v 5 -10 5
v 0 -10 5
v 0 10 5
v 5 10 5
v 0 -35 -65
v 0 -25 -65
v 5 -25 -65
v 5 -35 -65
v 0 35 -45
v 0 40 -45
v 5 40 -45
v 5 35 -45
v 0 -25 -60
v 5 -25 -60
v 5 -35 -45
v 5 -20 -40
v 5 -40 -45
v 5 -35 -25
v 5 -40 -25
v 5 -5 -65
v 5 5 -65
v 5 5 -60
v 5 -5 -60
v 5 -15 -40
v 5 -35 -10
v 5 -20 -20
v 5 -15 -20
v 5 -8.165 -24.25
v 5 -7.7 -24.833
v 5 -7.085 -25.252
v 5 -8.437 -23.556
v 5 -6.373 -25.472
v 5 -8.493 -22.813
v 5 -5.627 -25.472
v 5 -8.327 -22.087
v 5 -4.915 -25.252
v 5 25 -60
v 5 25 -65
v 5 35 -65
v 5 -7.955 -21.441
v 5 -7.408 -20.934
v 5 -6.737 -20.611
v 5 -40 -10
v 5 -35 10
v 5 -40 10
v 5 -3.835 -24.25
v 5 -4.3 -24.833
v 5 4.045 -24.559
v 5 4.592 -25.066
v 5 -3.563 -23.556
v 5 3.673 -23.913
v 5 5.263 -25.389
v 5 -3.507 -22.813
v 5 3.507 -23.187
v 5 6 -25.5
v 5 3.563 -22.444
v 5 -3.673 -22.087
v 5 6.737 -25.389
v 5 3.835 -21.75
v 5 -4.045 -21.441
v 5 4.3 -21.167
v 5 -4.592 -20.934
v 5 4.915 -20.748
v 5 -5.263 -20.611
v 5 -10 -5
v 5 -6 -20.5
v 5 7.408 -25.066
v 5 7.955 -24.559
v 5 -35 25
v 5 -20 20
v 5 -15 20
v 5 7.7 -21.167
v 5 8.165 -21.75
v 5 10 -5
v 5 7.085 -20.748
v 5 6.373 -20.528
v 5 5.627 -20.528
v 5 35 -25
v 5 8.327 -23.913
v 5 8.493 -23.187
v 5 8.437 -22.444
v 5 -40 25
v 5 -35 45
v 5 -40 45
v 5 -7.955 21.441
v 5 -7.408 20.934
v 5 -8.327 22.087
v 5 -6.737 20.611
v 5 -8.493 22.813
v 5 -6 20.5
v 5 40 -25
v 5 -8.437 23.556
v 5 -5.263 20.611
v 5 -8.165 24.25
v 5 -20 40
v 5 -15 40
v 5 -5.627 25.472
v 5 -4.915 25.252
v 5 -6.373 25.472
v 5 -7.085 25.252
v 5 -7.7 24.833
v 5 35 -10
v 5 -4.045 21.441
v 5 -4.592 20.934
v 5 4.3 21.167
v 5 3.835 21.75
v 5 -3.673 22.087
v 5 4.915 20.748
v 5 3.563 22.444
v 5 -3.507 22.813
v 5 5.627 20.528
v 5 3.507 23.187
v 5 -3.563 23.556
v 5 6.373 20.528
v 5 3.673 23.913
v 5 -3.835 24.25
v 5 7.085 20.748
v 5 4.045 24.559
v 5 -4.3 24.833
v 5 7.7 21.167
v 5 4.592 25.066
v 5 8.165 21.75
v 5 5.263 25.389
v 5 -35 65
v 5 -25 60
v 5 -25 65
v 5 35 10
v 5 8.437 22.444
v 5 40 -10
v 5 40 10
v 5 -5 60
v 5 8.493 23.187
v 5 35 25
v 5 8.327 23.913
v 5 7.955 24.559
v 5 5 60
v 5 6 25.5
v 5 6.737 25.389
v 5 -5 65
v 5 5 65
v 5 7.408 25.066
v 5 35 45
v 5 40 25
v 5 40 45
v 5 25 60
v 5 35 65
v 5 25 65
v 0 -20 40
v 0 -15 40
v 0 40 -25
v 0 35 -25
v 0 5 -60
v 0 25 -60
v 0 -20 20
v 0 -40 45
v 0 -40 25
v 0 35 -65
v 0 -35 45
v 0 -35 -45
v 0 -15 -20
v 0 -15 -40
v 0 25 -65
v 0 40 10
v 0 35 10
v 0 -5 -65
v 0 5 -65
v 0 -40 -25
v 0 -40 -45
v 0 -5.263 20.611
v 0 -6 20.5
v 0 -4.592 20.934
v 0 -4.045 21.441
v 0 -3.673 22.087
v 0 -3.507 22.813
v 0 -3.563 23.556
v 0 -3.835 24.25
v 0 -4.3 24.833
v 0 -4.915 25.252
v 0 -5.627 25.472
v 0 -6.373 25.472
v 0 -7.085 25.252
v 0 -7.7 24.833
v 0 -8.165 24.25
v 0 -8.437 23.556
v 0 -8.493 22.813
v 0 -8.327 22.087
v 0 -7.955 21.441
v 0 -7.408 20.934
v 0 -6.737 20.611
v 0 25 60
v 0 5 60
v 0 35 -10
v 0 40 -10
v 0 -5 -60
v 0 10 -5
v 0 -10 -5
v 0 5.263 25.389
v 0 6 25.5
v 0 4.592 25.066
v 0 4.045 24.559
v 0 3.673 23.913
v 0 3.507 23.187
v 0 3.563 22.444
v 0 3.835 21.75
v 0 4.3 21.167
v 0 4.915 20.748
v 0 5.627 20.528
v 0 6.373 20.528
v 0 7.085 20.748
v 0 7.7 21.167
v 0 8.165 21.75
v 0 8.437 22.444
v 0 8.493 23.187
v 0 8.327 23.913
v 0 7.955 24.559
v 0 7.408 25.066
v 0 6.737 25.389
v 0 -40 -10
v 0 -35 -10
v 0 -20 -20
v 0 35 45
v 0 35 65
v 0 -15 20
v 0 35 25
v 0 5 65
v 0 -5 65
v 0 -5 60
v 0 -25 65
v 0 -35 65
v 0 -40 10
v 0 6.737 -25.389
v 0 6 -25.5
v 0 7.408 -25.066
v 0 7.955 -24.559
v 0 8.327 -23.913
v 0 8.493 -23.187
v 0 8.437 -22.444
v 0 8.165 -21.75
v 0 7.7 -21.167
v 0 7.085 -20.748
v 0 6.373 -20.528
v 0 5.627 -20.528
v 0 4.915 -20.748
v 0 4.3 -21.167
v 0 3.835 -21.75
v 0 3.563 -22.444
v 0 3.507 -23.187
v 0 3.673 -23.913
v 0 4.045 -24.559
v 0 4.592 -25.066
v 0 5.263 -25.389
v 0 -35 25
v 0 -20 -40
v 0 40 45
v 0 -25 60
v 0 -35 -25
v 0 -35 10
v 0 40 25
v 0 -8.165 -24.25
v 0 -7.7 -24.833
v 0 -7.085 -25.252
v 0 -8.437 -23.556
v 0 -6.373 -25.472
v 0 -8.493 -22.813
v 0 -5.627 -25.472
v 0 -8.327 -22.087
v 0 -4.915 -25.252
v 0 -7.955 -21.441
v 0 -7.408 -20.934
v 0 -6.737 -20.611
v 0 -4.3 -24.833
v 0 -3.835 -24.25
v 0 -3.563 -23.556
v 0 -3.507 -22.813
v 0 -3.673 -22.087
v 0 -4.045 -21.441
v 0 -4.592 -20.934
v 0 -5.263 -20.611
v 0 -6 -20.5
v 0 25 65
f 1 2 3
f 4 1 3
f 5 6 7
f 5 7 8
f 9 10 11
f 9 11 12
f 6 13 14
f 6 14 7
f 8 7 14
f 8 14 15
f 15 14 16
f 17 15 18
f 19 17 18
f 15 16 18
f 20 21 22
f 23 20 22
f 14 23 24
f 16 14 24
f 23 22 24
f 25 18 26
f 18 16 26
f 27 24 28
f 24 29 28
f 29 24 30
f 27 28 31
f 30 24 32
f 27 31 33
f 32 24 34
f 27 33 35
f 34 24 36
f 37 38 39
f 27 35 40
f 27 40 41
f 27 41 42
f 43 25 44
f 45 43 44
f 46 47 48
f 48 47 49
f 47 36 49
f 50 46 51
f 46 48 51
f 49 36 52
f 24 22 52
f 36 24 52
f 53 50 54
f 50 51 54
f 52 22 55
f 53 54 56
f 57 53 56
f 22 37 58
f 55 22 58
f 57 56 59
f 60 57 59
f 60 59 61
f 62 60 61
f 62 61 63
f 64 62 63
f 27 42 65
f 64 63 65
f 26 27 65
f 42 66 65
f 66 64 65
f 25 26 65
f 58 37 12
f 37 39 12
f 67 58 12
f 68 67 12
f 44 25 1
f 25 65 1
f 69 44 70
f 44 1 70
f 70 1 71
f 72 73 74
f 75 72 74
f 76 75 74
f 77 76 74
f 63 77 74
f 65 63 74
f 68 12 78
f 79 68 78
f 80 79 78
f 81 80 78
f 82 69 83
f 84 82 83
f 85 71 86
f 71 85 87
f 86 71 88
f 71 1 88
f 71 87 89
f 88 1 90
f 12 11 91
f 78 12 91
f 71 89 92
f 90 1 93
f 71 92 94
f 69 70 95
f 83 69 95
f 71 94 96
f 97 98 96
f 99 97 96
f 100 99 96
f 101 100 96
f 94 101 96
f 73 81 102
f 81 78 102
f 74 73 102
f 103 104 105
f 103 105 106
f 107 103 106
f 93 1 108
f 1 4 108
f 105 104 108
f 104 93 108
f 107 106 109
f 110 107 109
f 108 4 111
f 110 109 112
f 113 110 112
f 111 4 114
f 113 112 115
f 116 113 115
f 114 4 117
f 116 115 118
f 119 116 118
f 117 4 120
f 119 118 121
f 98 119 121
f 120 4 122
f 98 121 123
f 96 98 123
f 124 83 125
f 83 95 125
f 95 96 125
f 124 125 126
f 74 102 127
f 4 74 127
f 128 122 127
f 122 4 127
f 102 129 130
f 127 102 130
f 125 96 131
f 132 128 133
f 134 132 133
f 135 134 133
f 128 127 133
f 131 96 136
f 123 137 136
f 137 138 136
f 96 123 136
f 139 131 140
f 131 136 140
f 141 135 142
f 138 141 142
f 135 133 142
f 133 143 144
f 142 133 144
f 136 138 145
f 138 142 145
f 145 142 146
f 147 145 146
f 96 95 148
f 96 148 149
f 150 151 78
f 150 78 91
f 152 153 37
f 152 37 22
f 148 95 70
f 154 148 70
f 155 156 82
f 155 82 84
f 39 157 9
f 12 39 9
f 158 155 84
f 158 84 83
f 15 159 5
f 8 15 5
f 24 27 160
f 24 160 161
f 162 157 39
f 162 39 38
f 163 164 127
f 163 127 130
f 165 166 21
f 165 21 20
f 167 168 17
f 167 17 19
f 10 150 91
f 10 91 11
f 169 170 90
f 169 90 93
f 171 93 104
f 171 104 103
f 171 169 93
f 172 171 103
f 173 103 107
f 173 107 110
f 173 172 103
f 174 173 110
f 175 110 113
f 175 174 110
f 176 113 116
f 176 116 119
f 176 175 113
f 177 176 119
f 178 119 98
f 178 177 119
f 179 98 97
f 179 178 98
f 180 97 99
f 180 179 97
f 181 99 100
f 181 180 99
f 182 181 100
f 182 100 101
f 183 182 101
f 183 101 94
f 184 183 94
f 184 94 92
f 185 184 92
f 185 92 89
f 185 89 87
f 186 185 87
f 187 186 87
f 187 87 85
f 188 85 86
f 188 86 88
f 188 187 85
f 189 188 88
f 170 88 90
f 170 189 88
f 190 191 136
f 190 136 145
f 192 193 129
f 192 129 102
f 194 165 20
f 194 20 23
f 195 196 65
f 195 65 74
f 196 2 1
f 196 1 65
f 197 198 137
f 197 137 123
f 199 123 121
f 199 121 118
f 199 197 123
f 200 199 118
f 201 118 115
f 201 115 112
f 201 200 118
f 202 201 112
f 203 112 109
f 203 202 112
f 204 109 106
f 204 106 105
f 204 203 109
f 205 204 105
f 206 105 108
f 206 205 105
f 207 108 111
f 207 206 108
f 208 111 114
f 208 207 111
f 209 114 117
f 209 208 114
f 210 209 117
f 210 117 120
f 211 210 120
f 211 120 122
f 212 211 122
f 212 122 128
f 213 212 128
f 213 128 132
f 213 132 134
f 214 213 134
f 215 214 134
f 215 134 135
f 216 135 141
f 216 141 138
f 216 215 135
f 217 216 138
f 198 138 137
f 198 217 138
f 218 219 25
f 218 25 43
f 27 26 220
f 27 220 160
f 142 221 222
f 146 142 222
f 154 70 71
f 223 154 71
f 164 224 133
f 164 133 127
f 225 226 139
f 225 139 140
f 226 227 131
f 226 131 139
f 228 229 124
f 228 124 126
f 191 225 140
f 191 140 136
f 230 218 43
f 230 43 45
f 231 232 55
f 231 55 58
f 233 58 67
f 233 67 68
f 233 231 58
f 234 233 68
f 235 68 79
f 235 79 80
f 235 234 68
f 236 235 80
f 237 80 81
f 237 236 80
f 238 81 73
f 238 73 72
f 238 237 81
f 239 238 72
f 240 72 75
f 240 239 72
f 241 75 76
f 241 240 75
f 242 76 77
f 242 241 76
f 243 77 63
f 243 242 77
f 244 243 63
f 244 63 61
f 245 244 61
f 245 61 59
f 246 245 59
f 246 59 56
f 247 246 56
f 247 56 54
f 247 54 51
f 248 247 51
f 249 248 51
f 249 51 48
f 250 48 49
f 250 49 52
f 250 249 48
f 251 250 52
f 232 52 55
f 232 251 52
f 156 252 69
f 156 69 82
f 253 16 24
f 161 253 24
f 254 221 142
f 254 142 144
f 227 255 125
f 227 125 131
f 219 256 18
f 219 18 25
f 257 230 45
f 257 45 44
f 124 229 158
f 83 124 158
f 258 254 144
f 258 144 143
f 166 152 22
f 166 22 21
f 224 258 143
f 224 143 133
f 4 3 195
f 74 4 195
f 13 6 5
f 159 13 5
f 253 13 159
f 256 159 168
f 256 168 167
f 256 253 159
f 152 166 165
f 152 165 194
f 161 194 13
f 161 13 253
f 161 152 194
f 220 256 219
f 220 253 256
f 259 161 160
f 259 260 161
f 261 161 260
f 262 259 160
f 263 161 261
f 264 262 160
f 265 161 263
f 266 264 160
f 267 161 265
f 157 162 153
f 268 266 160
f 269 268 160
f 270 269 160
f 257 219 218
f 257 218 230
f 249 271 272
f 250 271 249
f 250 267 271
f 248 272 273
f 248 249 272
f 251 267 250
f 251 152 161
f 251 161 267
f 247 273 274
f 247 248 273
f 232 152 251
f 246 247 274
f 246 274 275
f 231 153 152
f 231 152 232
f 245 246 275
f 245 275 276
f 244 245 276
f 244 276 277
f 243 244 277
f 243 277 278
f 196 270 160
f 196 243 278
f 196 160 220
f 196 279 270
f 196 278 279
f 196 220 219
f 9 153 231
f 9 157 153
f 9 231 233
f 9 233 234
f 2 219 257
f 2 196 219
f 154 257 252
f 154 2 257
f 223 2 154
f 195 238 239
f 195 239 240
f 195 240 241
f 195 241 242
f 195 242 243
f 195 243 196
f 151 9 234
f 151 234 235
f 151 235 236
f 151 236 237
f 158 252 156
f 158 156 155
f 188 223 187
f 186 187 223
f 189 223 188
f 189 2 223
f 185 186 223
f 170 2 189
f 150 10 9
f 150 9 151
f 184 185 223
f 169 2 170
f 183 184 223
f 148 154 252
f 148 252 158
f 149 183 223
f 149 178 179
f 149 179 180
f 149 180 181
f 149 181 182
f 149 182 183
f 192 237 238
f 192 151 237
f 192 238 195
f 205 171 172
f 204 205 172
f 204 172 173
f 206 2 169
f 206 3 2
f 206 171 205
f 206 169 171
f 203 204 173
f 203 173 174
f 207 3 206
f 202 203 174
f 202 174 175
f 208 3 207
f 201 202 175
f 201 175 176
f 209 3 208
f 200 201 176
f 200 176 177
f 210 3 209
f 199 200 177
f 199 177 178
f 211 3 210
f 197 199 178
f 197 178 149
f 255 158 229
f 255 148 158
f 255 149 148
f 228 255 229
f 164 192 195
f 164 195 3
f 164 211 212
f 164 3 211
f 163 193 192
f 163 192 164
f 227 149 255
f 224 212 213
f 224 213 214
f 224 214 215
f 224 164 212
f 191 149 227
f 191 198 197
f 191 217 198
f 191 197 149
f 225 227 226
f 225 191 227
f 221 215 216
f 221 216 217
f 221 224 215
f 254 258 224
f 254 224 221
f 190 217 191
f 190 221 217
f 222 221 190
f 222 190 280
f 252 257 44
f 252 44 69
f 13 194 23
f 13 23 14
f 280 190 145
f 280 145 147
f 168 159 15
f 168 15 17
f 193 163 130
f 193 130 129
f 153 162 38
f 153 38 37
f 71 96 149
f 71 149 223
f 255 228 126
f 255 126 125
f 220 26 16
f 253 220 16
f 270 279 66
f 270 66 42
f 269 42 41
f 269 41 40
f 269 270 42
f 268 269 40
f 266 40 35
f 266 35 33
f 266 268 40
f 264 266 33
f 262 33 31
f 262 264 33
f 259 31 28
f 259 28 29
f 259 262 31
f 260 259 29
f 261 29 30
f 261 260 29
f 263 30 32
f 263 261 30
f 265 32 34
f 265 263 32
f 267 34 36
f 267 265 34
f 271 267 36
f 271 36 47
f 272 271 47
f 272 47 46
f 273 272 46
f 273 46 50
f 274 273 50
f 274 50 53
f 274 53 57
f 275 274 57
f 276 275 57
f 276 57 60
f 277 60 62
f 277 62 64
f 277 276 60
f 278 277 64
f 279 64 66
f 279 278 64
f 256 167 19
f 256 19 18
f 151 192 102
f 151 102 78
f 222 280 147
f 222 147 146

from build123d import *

# Parameters (mm, degrees)
BOSS_EXTRUDE1_DEPTH = 5
SKETCH2_R           = 2.5
SKETCH2_W           = 10
SKETCH2_H           = 20
CUT_EXTRUDE1_DEPTH  = 5
SKETCH3_W           = 20
SKETCH3_H           = 5
CUT_EXTRUDE2_DEPTH  = 5


with BuildPart() as part:
    # Sketch1 → Boss-Extrude1 (new body)
    with BuildSketch(Plane(origin=(0, 0, 0), x_dir=(0, 0, -1), z_dir=(1, 0, 0))):
        Polygon((65, 35), (65, 25), (60, 25), (60, 5), (65, 5), (65, -5), (60, -5), (60, -25), (65, -25), (65, -35), (60, -35), (45, -35), (45, -40), (25, -40), (25, -35), (10, -35), (10, -40), (-10, -40), (-10, -35), (-25, -35), (-25, -40), (-45, -40), (-45, -35), (-60, -35), (-65, -35), (-65, -25), (-60, -25), (-60, -5), (-65, -5), (-65, 5), (-60, 5), (-60, 25), (-65, 25), (-65, 35), (-60, 35), (-45, 35), (-45, 40), (-25, 40), (-25, 35), (-10, 35), (-10, 40), (10, 40), (10, 35), (25, 35), (25, 40), (45, 40), (45, 35), (60, 35), align=None)
    extrude(amount=BOSS_EXTRUDE1_DEPTH)

    # Sketch2 → Cut-Extrude1 (cut)
    with BuildSketch(Plane(origin=(0, 0, 0), x_dir=(0, 0, -1), z_dir=(1, 0, 0))):
        with Locations((23, 6)):
            Circle(SKETCH2_R)
        with Locations(Location((23, -6, 0), (0, 0, 180))):
            Circle(SKETCH2_R)
        with Locations((-23, -6)):
            Circle(SKETCH2_R)
        with Locations(Location((-23, 6, 0), (0, 0, 180))):
            Circle(SKETCH2_R)
        Rectangle(SKETCH2_W, SKETCH2_H)
    extrude(amount=CUT_EXTRUDE1_DEPTH, mode=Mode.SUBTRACT)

    # Sketch3 → Cut-Extrude2 (cut)
    with BuildSketch(Plane(origin=(5, 0, 0), x_dir=(0, 0, -1), z_dir=(1, 0, 0))):
        with Locations((30, -17.5)):
            Rectangle(SKETCH3_W, SKETCH3_H)
        with Locations((-30, -17.5)):
            Rectangle(SKETCH3_W, SKETCH3_H)
    extrude(amount=-CUT_EXTRUDE2_DEPTH, mode=Mode.SUBTRACT)


solid = part.part
